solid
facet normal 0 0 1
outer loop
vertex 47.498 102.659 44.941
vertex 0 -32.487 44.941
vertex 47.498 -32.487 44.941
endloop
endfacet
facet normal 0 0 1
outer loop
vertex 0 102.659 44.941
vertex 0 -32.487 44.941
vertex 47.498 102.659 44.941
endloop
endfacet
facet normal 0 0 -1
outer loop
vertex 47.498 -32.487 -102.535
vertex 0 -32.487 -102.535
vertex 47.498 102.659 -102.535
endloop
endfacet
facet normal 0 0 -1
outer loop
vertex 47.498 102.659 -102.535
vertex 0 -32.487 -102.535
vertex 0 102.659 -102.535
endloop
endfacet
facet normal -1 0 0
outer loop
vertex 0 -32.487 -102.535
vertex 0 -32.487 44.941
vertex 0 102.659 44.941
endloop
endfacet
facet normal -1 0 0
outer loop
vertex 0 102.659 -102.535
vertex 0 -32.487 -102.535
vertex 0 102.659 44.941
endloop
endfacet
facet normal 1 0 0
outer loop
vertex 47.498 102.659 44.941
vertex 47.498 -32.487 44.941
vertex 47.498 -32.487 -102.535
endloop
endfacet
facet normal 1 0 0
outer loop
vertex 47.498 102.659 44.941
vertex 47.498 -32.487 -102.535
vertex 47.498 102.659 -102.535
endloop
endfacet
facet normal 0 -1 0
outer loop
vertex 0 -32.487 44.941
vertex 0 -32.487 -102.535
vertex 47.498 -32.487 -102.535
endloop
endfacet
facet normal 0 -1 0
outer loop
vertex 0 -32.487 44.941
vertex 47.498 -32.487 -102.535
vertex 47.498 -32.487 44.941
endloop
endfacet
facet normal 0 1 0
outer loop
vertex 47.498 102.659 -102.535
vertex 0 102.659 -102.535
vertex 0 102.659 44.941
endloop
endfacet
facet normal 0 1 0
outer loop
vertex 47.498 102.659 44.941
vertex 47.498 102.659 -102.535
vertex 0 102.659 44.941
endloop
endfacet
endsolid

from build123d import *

# Parameters (mm, degrees)
F0_W     = 55.2281737328
F0_H     = 28.3643379807
F1_DEPTH = 47.498
F0_W_2   = 135.1466029882
F0_H_2   = 147.4758796394


with BuildPart() as f1:
    # F0 (on Right) → F1 (new body)
    with BuildSketch(Plane.YZ):
        with Locations((130.2735358477, -116.7170666158)):
            Rectangle(F0_W, F0_H)
    extrude(amount=F1_DEPTH)


with BuildPart() as f1b:
    # F0 (on Right) → F1, piece 2 (new body)
    with BuildSketch(Plane.YZ):
        with Locations((35.0861474872, -28.7969578058)):
            Rectangle(F0_W_2, F0_H_2)
    extrude(amount=F1_DEPTH)


solid = f1b.part
